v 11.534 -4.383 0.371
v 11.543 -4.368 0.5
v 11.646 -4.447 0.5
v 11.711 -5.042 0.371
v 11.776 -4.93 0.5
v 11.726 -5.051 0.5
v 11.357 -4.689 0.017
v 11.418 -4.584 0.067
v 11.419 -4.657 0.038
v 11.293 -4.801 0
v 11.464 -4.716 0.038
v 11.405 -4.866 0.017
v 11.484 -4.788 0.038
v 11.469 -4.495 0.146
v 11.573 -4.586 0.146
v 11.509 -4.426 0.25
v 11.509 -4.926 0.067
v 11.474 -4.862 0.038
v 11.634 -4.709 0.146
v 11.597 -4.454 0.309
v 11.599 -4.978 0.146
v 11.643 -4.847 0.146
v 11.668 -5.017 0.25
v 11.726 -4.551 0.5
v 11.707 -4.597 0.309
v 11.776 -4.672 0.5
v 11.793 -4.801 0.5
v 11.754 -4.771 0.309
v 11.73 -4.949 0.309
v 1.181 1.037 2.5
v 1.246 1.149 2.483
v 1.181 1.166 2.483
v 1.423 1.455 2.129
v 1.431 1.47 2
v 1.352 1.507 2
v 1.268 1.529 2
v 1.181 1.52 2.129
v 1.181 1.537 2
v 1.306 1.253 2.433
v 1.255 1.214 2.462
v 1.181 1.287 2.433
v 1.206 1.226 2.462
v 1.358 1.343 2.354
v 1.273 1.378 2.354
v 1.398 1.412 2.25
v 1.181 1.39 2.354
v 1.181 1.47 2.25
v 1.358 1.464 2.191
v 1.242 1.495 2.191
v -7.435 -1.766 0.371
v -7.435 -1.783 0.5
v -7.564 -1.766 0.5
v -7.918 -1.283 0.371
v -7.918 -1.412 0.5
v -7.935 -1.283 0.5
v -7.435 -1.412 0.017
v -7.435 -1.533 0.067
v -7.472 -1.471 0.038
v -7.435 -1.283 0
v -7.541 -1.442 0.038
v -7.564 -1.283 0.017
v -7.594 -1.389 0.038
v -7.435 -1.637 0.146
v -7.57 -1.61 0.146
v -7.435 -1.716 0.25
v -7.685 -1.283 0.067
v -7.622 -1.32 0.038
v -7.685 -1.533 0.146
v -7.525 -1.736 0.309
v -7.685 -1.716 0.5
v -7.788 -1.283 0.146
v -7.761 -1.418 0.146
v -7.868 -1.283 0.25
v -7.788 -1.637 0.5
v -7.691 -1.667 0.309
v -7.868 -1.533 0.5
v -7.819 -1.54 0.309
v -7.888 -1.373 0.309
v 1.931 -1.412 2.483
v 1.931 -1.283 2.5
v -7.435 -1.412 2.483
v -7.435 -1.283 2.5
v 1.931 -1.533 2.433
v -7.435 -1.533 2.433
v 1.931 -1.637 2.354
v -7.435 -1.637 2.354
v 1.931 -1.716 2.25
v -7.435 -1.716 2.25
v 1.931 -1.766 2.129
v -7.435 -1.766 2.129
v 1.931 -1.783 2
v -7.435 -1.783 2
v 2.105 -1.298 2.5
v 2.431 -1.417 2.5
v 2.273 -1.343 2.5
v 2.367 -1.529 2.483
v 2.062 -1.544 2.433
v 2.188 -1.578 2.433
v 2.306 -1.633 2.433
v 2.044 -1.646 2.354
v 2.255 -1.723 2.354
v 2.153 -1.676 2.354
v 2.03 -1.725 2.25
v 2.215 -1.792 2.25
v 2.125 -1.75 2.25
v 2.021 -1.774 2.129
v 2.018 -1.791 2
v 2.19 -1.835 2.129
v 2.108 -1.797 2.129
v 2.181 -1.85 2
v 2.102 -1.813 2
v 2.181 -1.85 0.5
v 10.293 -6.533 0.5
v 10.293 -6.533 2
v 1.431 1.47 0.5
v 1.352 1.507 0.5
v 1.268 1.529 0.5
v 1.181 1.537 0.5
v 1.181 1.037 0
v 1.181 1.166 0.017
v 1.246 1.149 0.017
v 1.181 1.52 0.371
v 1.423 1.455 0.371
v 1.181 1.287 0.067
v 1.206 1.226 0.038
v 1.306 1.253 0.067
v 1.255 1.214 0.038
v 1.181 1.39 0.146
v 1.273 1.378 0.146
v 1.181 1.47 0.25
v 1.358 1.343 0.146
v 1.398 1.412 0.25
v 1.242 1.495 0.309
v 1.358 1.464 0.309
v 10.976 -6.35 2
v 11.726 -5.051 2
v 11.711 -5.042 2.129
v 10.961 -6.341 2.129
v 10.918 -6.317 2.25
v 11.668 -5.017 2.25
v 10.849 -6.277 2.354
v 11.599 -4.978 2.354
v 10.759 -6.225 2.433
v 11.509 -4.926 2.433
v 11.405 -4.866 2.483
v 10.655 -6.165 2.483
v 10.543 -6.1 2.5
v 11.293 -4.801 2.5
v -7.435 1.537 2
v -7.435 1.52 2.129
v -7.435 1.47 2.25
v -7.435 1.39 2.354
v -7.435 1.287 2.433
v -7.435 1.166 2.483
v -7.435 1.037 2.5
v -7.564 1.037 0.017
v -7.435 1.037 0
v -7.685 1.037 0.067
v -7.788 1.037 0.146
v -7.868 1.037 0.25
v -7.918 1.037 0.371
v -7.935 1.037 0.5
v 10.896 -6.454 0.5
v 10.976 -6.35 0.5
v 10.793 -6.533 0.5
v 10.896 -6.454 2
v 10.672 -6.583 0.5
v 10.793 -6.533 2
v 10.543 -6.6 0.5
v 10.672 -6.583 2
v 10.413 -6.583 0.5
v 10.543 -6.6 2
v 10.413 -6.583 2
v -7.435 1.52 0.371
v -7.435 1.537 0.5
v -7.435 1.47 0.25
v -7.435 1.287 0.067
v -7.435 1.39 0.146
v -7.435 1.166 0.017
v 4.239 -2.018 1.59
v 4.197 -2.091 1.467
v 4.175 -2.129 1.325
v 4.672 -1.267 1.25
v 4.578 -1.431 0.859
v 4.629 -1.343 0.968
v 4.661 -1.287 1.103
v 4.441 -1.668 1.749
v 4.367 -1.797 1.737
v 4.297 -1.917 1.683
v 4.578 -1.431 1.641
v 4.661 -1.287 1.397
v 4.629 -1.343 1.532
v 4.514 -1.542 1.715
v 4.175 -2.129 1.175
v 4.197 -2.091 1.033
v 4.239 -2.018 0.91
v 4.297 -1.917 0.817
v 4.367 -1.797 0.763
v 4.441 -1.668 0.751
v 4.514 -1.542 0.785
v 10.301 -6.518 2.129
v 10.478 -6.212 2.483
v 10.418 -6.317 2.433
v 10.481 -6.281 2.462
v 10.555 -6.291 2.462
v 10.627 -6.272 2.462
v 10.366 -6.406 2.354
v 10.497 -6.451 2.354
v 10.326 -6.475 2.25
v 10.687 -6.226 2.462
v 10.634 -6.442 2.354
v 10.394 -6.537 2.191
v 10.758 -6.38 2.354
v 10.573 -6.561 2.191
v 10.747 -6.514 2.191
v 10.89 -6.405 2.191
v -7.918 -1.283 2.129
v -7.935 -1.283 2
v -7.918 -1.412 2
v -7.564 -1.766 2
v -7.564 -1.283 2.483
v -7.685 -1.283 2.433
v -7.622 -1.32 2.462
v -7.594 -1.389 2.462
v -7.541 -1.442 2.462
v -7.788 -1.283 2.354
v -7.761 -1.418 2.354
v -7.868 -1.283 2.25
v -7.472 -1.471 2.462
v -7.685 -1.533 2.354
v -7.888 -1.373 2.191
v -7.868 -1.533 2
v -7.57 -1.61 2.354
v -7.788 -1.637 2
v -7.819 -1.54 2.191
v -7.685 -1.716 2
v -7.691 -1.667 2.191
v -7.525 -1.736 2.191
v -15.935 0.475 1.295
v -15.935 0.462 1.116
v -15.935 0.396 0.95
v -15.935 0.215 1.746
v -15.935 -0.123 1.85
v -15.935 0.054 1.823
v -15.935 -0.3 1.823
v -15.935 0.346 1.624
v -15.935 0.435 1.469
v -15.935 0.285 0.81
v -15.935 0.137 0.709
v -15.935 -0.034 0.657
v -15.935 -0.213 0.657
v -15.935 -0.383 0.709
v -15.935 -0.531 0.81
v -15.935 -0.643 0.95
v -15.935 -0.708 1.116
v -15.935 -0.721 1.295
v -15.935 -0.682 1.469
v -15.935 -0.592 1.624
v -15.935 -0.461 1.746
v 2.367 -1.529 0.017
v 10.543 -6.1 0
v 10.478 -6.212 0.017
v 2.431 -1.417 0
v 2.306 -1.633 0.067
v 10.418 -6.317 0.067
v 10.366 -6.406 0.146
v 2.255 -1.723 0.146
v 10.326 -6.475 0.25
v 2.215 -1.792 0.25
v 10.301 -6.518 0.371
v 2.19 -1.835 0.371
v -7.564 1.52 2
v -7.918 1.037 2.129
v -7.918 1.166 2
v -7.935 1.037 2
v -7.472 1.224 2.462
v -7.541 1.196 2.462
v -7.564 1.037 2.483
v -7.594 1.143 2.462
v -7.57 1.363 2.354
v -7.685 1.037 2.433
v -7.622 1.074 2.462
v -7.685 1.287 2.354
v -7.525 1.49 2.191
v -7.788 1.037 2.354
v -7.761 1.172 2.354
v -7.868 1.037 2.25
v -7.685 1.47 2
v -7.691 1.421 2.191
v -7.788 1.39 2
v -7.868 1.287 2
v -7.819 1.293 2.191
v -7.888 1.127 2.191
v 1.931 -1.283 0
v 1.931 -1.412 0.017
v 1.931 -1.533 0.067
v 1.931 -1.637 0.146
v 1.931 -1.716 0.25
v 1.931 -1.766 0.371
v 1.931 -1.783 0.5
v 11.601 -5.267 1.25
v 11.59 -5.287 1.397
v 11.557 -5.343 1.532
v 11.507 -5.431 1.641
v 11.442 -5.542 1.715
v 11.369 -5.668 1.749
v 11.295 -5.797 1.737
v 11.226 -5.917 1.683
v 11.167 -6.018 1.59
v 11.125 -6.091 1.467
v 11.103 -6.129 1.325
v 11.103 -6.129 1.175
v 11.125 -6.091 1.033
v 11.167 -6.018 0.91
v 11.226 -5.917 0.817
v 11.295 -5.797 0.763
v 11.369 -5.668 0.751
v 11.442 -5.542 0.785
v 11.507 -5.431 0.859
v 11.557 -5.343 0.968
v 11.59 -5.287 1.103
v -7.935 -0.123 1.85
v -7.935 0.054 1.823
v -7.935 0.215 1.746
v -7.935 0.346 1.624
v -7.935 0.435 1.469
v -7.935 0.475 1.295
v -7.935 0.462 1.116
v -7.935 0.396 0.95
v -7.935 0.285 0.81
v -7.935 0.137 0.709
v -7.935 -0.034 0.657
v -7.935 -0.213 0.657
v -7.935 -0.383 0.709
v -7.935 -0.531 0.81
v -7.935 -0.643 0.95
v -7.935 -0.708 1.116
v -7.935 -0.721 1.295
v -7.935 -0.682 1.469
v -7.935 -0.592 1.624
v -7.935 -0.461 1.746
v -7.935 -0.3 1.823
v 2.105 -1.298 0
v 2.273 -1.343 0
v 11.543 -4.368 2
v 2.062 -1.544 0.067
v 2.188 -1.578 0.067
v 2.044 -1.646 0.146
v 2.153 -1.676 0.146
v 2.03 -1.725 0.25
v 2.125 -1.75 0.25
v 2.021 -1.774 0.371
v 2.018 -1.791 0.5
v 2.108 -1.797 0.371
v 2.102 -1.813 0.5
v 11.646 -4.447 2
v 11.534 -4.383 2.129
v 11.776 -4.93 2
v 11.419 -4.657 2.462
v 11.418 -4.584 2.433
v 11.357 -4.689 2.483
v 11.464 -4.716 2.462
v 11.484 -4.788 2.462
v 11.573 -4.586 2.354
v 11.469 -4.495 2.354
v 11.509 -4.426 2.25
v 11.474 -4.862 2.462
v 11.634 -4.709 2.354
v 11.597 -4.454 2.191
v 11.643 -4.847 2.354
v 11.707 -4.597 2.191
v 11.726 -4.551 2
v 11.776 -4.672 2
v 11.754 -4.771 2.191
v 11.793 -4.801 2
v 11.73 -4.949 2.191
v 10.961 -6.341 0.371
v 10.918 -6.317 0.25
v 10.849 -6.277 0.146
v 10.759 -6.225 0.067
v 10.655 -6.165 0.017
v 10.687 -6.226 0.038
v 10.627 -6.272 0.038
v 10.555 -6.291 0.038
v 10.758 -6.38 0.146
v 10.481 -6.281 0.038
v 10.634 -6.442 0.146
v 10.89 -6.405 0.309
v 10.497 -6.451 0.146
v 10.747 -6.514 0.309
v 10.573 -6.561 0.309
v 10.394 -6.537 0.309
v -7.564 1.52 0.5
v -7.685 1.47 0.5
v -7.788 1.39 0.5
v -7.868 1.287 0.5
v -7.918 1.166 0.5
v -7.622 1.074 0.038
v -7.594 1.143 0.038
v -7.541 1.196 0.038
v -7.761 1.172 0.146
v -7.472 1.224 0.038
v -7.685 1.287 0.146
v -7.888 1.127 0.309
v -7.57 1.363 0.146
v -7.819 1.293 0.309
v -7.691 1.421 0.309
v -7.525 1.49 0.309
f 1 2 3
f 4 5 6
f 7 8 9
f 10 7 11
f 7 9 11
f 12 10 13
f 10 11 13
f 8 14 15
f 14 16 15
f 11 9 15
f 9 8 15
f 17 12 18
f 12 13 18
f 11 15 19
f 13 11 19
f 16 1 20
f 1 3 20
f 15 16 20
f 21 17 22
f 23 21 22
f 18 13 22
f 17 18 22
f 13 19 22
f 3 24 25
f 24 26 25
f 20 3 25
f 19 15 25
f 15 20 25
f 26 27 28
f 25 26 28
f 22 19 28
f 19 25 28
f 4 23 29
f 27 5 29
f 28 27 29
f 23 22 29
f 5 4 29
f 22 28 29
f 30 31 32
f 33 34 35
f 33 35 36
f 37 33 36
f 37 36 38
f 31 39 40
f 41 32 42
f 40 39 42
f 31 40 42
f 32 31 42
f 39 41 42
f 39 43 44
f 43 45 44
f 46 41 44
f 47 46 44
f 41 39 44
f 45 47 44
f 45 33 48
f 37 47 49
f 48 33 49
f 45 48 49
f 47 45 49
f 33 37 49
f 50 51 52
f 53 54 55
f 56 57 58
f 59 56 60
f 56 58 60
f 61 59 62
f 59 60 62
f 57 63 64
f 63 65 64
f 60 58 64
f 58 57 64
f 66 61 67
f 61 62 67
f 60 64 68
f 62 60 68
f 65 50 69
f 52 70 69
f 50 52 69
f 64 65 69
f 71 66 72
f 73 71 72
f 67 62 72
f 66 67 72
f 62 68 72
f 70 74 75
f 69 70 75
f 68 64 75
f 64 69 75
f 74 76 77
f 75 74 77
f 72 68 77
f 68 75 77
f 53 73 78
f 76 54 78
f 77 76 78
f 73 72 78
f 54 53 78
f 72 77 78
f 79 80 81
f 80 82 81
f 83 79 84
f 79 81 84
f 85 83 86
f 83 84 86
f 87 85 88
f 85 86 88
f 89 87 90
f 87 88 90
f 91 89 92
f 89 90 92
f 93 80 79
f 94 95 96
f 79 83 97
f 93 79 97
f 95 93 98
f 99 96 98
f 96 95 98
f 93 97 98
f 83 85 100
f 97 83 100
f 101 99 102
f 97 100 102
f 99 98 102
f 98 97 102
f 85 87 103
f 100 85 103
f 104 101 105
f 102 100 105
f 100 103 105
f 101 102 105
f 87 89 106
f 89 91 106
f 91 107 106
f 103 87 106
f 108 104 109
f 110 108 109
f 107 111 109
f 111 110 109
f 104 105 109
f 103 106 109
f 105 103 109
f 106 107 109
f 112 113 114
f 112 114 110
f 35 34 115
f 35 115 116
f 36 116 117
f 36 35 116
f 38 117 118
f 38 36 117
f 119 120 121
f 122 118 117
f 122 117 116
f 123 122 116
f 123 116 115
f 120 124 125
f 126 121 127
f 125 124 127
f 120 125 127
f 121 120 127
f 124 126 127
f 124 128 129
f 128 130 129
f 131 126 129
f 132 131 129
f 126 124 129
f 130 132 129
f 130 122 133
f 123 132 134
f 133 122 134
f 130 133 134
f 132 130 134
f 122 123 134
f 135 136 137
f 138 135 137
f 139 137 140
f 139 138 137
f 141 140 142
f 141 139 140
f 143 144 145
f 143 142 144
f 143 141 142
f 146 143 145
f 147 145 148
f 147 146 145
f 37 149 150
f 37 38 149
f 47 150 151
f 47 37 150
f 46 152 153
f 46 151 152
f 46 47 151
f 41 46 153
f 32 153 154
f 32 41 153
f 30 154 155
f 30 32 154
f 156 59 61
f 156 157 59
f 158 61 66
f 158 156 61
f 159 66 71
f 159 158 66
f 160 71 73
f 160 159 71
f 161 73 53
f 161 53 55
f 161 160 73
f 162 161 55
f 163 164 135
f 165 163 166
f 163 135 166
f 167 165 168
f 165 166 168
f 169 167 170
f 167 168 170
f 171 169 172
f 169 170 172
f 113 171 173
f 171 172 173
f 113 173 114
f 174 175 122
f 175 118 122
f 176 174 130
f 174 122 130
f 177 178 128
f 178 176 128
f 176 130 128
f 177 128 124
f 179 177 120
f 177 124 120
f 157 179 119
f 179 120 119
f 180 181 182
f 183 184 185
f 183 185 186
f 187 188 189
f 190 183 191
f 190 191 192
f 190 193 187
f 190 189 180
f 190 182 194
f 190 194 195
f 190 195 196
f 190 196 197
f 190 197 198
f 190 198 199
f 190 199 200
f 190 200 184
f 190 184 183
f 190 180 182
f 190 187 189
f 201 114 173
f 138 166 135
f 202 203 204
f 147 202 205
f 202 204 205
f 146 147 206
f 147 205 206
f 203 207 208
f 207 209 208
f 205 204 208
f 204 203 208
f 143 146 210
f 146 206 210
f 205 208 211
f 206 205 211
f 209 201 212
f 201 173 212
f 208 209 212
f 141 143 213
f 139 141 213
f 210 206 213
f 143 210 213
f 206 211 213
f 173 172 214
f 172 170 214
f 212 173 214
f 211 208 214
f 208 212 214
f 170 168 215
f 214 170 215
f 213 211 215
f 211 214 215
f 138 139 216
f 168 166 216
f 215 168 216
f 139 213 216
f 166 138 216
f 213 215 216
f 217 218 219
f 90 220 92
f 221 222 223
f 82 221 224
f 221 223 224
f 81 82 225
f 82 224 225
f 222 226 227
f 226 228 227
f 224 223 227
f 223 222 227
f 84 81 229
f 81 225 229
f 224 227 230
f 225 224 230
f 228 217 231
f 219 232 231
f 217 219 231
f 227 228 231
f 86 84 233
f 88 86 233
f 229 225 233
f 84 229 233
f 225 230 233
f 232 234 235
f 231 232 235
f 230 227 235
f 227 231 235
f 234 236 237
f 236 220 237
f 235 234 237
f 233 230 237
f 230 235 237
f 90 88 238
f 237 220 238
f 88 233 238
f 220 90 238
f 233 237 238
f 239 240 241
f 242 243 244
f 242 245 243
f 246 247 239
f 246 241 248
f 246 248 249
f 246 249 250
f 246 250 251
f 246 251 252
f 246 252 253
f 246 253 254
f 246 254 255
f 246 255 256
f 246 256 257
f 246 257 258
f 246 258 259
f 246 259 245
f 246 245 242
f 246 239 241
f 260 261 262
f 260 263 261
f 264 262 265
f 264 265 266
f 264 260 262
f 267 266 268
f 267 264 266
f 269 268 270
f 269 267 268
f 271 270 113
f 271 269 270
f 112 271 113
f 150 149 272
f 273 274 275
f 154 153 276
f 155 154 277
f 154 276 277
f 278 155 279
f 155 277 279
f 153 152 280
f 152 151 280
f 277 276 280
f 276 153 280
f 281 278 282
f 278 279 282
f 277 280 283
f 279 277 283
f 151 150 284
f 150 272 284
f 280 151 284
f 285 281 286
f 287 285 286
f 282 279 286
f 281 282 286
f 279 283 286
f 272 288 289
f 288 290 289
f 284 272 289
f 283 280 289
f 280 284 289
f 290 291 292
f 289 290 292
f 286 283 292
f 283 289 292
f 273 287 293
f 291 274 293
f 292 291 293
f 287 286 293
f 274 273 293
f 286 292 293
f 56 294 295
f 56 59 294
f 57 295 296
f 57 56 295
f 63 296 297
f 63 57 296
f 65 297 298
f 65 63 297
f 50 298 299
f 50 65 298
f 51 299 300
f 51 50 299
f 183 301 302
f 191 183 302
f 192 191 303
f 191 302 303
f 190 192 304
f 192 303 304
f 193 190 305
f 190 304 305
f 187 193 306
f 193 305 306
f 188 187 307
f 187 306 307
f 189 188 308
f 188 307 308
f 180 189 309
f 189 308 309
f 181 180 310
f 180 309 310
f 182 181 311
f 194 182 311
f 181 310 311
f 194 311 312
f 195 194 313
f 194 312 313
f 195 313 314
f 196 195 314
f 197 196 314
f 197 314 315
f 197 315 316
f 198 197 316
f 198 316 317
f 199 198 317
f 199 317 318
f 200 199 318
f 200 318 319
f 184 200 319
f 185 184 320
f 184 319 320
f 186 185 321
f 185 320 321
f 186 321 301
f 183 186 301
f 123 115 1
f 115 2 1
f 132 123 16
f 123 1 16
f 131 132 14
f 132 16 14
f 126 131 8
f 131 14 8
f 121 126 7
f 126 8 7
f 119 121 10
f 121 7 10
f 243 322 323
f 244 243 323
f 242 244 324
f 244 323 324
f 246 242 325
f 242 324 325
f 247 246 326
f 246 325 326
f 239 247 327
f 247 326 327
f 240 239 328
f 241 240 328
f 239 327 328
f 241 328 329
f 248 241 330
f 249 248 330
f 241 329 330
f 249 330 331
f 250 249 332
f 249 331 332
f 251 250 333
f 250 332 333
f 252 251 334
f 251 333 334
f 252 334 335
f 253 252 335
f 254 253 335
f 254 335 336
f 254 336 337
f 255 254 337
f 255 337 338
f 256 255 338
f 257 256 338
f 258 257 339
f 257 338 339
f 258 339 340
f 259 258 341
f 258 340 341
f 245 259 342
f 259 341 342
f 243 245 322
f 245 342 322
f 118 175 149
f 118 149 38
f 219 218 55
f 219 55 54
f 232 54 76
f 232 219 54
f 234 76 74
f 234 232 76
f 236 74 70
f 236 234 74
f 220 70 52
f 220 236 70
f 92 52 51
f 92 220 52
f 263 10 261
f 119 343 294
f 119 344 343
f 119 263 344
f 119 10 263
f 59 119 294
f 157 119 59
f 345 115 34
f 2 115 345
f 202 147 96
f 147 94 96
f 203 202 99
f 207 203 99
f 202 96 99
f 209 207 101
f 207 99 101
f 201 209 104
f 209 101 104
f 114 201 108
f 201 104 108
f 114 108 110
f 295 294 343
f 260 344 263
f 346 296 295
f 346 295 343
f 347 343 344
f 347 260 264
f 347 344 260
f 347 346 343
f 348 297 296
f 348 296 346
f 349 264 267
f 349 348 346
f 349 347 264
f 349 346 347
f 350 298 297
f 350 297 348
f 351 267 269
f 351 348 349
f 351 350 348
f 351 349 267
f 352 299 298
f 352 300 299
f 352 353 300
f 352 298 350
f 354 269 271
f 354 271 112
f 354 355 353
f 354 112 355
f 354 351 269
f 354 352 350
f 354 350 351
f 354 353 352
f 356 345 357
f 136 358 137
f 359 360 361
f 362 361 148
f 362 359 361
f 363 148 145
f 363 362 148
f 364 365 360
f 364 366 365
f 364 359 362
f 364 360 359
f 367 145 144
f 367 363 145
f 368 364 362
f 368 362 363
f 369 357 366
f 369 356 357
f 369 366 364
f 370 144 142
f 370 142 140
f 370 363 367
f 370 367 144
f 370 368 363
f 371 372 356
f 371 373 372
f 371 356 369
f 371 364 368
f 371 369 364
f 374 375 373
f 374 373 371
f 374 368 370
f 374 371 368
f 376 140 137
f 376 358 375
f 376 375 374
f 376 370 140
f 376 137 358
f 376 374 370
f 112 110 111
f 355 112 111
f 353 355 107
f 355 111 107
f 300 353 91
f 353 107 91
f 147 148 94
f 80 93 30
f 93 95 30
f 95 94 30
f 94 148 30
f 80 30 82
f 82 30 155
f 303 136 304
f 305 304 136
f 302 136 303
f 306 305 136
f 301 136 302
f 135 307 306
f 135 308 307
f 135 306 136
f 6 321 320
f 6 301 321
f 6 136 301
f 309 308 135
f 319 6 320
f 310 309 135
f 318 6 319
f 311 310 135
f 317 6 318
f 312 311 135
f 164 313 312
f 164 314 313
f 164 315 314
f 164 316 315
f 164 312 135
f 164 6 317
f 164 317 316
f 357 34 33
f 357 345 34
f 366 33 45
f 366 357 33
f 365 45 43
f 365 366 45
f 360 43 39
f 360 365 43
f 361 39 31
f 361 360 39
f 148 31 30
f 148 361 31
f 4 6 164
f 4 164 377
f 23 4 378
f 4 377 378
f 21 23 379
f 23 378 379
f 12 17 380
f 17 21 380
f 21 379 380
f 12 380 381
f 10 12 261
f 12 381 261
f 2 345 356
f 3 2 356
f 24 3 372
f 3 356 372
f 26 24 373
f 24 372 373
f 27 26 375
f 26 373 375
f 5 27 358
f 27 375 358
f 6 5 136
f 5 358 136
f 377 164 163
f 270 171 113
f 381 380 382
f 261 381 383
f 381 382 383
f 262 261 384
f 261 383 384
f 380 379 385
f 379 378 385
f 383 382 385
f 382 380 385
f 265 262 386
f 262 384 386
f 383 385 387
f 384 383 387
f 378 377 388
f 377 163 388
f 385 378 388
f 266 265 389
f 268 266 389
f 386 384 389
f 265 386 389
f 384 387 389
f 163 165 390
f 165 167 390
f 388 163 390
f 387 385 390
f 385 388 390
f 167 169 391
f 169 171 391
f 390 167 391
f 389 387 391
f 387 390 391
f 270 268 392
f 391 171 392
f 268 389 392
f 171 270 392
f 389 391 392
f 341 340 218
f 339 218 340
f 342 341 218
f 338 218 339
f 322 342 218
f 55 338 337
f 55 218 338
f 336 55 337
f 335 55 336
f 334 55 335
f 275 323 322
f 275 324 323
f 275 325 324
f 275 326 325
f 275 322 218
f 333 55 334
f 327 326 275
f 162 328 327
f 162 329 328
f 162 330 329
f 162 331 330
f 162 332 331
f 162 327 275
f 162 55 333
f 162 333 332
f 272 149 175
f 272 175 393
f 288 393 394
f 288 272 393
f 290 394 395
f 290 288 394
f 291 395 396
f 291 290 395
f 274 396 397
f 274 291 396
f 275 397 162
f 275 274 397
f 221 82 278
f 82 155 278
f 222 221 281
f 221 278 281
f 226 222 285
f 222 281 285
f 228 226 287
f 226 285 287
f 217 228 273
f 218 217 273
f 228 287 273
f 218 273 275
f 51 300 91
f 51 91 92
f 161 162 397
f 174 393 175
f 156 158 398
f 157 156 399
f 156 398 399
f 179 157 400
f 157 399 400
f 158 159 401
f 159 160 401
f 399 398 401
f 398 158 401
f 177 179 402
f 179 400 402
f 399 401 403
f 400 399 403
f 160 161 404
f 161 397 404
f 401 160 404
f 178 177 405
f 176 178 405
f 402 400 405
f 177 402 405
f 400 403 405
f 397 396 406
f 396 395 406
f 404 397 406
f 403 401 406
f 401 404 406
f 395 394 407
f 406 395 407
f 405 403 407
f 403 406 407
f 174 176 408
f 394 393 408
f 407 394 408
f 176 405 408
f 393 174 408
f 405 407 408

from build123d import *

# Parameters (mm, degrees)
EXTRUDE_1_DEPTH     = 2.5
SKETCH_2_R          = 0.5
CUT_EXTRUDE_1_DEPTH = 8
SKETCH_3_R          = 0.6
EXTRUDE_2_DEPTH     = 8
FILLET_1_R          = 0.5


with BuildPart() as part:
    # 草图1 → 凸台-拉伸1 (new body)
    with BuildSketch(Plane.XY):
        Polygon((1.315447425, 1.536749297), (11.975701463, -4.617951242), (10.725701463, -6.783014751), (2.065447425, -1.783014751), (-7.934552575, -1.783014751), (-7.934552575, 1.536749297), align=None)
    extrude(amount=EXTRUDE_1_DEPTH)

    # 草图2 → 切除-拉伸1 (cut)
    with BuildSketch(Plane(origin=(10.981407641, -6.340118658, 0), x_dir=(0, 0, -1), z_dir=(0.8660254037844386, -0.5, 0))):
        with Locations(Location((-1.25, 0.738587643, 0), (0, 0, 90))):
            Circle(SKETCH_2_R)
    extrude(amount=-CUT_EXTRUDE_1_DEPTH, mode=Mode.SUBTRACT)

    # 草图3 → 凸台-拉伸2 (add)
    with BuildSketch(Plane.ZY.offset(7.934552575)):
        with Locations((1.25, -0.123132727)):
            Circle(SKETCH_3_R)
    extrude(amount=EXTRUDE_2_DEPTH)

    # 圆角1
    fillet_1_edges = [part.edges().sort_by_distance(p)[0] for p in [
        (2.065447425, -1.783014751, 1.25),
        (-7.934552575, -1.783014751, 1.25),
        (-7.934552575, 1.536749297, 1.25),
        (1.315447425, 1.536749297, 1.25),
        (11.975701463, -4.617951242, 1.25),
        (10.725701463, -6.783014751, 1.25),
        (6.645574444, -1.540600973, 2.5),
        (-3.309552575, 1.536749297, 2.5),
        (-7.934552575, -0.123132727, 2.5),
        (-2.934552575, -1.783014751, 2.5),
        (6.395574444, -4.283014751, 2.5),
        (-2.934552575, -1.783014751, 0),
        (-7.934552575, -0.123132727, 0),
        (-3.309552575, 1.536749297, 0),
        (6.645574444, -1.540600973, 0),
        (11.350701463, -5.700482996, 0),
        (6.395574444, -4.283014751, 0),
        (11.350701463, -5.700482996, 2.5),
    ]]
    fillet(fillet_1_edges, radius=FILLET_1_R)


solid = part.part
